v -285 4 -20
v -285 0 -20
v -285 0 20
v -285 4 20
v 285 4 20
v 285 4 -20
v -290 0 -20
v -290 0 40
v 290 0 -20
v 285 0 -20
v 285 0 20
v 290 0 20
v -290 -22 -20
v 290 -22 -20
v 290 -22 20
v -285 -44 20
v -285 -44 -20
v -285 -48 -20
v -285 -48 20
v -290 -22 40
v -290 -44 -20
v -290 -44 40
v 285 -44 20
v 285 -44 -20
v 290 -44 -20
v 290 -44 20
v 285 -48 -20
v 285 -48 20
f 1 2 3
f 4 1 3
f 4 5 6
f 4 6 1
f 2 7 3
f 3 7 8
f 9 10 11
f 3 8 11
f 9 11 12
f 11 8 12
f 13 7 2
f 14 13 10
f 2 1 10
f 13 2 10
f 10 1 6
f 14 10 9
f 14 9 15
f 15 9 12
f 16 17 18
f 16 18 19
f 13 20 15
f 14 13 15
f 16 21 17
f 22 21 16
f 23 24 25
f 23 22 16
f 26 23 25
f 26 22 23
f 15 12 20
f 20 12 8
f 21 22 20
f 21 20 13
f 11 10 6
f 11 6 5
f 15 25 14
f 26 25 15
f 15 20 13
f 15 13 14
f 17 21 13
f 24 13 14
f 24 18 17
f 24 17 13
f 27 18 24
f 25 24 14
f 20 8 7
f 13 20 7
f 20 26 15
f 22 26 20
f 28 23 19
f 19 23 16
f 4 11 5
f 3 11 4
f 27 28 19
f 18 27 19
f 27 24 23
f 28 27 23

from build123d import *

# Parameters (mm, degrees)
F1_DEPTH = 22
F2_W     = 570
F2_H     = 40
F3_DEPTH = 4


with BuildPart() as f1:
    # F0 (on Front) → F1 (new body)
    with BuildSketch(Plane.XZ):
        Polygon((290, 20), (-290, 40), (-290, -20), (290, -20), align=None)
    extrude(amount=F1_DEPTH)

    # F2 (on face) → F3 (join)
    with BuildSketch(Plane(origin=(0, 0, 0), x_dir=(-1, 0, 0), z_dir=(0, 1, 0))):
        Rectangle(F2_W, F2_H)
    extrude(amount=F3_DEPTH)


with BuildPart() as f4_1:
    # F4: instance of F1
    add(f1.part.mirror(Plane(origin=(-19.333333, -22, 5.333333), x_dir=(1, 0, 0), z_dir=(0, -1, 0))))


solid = Compound([f1.part, f4_1.part])
